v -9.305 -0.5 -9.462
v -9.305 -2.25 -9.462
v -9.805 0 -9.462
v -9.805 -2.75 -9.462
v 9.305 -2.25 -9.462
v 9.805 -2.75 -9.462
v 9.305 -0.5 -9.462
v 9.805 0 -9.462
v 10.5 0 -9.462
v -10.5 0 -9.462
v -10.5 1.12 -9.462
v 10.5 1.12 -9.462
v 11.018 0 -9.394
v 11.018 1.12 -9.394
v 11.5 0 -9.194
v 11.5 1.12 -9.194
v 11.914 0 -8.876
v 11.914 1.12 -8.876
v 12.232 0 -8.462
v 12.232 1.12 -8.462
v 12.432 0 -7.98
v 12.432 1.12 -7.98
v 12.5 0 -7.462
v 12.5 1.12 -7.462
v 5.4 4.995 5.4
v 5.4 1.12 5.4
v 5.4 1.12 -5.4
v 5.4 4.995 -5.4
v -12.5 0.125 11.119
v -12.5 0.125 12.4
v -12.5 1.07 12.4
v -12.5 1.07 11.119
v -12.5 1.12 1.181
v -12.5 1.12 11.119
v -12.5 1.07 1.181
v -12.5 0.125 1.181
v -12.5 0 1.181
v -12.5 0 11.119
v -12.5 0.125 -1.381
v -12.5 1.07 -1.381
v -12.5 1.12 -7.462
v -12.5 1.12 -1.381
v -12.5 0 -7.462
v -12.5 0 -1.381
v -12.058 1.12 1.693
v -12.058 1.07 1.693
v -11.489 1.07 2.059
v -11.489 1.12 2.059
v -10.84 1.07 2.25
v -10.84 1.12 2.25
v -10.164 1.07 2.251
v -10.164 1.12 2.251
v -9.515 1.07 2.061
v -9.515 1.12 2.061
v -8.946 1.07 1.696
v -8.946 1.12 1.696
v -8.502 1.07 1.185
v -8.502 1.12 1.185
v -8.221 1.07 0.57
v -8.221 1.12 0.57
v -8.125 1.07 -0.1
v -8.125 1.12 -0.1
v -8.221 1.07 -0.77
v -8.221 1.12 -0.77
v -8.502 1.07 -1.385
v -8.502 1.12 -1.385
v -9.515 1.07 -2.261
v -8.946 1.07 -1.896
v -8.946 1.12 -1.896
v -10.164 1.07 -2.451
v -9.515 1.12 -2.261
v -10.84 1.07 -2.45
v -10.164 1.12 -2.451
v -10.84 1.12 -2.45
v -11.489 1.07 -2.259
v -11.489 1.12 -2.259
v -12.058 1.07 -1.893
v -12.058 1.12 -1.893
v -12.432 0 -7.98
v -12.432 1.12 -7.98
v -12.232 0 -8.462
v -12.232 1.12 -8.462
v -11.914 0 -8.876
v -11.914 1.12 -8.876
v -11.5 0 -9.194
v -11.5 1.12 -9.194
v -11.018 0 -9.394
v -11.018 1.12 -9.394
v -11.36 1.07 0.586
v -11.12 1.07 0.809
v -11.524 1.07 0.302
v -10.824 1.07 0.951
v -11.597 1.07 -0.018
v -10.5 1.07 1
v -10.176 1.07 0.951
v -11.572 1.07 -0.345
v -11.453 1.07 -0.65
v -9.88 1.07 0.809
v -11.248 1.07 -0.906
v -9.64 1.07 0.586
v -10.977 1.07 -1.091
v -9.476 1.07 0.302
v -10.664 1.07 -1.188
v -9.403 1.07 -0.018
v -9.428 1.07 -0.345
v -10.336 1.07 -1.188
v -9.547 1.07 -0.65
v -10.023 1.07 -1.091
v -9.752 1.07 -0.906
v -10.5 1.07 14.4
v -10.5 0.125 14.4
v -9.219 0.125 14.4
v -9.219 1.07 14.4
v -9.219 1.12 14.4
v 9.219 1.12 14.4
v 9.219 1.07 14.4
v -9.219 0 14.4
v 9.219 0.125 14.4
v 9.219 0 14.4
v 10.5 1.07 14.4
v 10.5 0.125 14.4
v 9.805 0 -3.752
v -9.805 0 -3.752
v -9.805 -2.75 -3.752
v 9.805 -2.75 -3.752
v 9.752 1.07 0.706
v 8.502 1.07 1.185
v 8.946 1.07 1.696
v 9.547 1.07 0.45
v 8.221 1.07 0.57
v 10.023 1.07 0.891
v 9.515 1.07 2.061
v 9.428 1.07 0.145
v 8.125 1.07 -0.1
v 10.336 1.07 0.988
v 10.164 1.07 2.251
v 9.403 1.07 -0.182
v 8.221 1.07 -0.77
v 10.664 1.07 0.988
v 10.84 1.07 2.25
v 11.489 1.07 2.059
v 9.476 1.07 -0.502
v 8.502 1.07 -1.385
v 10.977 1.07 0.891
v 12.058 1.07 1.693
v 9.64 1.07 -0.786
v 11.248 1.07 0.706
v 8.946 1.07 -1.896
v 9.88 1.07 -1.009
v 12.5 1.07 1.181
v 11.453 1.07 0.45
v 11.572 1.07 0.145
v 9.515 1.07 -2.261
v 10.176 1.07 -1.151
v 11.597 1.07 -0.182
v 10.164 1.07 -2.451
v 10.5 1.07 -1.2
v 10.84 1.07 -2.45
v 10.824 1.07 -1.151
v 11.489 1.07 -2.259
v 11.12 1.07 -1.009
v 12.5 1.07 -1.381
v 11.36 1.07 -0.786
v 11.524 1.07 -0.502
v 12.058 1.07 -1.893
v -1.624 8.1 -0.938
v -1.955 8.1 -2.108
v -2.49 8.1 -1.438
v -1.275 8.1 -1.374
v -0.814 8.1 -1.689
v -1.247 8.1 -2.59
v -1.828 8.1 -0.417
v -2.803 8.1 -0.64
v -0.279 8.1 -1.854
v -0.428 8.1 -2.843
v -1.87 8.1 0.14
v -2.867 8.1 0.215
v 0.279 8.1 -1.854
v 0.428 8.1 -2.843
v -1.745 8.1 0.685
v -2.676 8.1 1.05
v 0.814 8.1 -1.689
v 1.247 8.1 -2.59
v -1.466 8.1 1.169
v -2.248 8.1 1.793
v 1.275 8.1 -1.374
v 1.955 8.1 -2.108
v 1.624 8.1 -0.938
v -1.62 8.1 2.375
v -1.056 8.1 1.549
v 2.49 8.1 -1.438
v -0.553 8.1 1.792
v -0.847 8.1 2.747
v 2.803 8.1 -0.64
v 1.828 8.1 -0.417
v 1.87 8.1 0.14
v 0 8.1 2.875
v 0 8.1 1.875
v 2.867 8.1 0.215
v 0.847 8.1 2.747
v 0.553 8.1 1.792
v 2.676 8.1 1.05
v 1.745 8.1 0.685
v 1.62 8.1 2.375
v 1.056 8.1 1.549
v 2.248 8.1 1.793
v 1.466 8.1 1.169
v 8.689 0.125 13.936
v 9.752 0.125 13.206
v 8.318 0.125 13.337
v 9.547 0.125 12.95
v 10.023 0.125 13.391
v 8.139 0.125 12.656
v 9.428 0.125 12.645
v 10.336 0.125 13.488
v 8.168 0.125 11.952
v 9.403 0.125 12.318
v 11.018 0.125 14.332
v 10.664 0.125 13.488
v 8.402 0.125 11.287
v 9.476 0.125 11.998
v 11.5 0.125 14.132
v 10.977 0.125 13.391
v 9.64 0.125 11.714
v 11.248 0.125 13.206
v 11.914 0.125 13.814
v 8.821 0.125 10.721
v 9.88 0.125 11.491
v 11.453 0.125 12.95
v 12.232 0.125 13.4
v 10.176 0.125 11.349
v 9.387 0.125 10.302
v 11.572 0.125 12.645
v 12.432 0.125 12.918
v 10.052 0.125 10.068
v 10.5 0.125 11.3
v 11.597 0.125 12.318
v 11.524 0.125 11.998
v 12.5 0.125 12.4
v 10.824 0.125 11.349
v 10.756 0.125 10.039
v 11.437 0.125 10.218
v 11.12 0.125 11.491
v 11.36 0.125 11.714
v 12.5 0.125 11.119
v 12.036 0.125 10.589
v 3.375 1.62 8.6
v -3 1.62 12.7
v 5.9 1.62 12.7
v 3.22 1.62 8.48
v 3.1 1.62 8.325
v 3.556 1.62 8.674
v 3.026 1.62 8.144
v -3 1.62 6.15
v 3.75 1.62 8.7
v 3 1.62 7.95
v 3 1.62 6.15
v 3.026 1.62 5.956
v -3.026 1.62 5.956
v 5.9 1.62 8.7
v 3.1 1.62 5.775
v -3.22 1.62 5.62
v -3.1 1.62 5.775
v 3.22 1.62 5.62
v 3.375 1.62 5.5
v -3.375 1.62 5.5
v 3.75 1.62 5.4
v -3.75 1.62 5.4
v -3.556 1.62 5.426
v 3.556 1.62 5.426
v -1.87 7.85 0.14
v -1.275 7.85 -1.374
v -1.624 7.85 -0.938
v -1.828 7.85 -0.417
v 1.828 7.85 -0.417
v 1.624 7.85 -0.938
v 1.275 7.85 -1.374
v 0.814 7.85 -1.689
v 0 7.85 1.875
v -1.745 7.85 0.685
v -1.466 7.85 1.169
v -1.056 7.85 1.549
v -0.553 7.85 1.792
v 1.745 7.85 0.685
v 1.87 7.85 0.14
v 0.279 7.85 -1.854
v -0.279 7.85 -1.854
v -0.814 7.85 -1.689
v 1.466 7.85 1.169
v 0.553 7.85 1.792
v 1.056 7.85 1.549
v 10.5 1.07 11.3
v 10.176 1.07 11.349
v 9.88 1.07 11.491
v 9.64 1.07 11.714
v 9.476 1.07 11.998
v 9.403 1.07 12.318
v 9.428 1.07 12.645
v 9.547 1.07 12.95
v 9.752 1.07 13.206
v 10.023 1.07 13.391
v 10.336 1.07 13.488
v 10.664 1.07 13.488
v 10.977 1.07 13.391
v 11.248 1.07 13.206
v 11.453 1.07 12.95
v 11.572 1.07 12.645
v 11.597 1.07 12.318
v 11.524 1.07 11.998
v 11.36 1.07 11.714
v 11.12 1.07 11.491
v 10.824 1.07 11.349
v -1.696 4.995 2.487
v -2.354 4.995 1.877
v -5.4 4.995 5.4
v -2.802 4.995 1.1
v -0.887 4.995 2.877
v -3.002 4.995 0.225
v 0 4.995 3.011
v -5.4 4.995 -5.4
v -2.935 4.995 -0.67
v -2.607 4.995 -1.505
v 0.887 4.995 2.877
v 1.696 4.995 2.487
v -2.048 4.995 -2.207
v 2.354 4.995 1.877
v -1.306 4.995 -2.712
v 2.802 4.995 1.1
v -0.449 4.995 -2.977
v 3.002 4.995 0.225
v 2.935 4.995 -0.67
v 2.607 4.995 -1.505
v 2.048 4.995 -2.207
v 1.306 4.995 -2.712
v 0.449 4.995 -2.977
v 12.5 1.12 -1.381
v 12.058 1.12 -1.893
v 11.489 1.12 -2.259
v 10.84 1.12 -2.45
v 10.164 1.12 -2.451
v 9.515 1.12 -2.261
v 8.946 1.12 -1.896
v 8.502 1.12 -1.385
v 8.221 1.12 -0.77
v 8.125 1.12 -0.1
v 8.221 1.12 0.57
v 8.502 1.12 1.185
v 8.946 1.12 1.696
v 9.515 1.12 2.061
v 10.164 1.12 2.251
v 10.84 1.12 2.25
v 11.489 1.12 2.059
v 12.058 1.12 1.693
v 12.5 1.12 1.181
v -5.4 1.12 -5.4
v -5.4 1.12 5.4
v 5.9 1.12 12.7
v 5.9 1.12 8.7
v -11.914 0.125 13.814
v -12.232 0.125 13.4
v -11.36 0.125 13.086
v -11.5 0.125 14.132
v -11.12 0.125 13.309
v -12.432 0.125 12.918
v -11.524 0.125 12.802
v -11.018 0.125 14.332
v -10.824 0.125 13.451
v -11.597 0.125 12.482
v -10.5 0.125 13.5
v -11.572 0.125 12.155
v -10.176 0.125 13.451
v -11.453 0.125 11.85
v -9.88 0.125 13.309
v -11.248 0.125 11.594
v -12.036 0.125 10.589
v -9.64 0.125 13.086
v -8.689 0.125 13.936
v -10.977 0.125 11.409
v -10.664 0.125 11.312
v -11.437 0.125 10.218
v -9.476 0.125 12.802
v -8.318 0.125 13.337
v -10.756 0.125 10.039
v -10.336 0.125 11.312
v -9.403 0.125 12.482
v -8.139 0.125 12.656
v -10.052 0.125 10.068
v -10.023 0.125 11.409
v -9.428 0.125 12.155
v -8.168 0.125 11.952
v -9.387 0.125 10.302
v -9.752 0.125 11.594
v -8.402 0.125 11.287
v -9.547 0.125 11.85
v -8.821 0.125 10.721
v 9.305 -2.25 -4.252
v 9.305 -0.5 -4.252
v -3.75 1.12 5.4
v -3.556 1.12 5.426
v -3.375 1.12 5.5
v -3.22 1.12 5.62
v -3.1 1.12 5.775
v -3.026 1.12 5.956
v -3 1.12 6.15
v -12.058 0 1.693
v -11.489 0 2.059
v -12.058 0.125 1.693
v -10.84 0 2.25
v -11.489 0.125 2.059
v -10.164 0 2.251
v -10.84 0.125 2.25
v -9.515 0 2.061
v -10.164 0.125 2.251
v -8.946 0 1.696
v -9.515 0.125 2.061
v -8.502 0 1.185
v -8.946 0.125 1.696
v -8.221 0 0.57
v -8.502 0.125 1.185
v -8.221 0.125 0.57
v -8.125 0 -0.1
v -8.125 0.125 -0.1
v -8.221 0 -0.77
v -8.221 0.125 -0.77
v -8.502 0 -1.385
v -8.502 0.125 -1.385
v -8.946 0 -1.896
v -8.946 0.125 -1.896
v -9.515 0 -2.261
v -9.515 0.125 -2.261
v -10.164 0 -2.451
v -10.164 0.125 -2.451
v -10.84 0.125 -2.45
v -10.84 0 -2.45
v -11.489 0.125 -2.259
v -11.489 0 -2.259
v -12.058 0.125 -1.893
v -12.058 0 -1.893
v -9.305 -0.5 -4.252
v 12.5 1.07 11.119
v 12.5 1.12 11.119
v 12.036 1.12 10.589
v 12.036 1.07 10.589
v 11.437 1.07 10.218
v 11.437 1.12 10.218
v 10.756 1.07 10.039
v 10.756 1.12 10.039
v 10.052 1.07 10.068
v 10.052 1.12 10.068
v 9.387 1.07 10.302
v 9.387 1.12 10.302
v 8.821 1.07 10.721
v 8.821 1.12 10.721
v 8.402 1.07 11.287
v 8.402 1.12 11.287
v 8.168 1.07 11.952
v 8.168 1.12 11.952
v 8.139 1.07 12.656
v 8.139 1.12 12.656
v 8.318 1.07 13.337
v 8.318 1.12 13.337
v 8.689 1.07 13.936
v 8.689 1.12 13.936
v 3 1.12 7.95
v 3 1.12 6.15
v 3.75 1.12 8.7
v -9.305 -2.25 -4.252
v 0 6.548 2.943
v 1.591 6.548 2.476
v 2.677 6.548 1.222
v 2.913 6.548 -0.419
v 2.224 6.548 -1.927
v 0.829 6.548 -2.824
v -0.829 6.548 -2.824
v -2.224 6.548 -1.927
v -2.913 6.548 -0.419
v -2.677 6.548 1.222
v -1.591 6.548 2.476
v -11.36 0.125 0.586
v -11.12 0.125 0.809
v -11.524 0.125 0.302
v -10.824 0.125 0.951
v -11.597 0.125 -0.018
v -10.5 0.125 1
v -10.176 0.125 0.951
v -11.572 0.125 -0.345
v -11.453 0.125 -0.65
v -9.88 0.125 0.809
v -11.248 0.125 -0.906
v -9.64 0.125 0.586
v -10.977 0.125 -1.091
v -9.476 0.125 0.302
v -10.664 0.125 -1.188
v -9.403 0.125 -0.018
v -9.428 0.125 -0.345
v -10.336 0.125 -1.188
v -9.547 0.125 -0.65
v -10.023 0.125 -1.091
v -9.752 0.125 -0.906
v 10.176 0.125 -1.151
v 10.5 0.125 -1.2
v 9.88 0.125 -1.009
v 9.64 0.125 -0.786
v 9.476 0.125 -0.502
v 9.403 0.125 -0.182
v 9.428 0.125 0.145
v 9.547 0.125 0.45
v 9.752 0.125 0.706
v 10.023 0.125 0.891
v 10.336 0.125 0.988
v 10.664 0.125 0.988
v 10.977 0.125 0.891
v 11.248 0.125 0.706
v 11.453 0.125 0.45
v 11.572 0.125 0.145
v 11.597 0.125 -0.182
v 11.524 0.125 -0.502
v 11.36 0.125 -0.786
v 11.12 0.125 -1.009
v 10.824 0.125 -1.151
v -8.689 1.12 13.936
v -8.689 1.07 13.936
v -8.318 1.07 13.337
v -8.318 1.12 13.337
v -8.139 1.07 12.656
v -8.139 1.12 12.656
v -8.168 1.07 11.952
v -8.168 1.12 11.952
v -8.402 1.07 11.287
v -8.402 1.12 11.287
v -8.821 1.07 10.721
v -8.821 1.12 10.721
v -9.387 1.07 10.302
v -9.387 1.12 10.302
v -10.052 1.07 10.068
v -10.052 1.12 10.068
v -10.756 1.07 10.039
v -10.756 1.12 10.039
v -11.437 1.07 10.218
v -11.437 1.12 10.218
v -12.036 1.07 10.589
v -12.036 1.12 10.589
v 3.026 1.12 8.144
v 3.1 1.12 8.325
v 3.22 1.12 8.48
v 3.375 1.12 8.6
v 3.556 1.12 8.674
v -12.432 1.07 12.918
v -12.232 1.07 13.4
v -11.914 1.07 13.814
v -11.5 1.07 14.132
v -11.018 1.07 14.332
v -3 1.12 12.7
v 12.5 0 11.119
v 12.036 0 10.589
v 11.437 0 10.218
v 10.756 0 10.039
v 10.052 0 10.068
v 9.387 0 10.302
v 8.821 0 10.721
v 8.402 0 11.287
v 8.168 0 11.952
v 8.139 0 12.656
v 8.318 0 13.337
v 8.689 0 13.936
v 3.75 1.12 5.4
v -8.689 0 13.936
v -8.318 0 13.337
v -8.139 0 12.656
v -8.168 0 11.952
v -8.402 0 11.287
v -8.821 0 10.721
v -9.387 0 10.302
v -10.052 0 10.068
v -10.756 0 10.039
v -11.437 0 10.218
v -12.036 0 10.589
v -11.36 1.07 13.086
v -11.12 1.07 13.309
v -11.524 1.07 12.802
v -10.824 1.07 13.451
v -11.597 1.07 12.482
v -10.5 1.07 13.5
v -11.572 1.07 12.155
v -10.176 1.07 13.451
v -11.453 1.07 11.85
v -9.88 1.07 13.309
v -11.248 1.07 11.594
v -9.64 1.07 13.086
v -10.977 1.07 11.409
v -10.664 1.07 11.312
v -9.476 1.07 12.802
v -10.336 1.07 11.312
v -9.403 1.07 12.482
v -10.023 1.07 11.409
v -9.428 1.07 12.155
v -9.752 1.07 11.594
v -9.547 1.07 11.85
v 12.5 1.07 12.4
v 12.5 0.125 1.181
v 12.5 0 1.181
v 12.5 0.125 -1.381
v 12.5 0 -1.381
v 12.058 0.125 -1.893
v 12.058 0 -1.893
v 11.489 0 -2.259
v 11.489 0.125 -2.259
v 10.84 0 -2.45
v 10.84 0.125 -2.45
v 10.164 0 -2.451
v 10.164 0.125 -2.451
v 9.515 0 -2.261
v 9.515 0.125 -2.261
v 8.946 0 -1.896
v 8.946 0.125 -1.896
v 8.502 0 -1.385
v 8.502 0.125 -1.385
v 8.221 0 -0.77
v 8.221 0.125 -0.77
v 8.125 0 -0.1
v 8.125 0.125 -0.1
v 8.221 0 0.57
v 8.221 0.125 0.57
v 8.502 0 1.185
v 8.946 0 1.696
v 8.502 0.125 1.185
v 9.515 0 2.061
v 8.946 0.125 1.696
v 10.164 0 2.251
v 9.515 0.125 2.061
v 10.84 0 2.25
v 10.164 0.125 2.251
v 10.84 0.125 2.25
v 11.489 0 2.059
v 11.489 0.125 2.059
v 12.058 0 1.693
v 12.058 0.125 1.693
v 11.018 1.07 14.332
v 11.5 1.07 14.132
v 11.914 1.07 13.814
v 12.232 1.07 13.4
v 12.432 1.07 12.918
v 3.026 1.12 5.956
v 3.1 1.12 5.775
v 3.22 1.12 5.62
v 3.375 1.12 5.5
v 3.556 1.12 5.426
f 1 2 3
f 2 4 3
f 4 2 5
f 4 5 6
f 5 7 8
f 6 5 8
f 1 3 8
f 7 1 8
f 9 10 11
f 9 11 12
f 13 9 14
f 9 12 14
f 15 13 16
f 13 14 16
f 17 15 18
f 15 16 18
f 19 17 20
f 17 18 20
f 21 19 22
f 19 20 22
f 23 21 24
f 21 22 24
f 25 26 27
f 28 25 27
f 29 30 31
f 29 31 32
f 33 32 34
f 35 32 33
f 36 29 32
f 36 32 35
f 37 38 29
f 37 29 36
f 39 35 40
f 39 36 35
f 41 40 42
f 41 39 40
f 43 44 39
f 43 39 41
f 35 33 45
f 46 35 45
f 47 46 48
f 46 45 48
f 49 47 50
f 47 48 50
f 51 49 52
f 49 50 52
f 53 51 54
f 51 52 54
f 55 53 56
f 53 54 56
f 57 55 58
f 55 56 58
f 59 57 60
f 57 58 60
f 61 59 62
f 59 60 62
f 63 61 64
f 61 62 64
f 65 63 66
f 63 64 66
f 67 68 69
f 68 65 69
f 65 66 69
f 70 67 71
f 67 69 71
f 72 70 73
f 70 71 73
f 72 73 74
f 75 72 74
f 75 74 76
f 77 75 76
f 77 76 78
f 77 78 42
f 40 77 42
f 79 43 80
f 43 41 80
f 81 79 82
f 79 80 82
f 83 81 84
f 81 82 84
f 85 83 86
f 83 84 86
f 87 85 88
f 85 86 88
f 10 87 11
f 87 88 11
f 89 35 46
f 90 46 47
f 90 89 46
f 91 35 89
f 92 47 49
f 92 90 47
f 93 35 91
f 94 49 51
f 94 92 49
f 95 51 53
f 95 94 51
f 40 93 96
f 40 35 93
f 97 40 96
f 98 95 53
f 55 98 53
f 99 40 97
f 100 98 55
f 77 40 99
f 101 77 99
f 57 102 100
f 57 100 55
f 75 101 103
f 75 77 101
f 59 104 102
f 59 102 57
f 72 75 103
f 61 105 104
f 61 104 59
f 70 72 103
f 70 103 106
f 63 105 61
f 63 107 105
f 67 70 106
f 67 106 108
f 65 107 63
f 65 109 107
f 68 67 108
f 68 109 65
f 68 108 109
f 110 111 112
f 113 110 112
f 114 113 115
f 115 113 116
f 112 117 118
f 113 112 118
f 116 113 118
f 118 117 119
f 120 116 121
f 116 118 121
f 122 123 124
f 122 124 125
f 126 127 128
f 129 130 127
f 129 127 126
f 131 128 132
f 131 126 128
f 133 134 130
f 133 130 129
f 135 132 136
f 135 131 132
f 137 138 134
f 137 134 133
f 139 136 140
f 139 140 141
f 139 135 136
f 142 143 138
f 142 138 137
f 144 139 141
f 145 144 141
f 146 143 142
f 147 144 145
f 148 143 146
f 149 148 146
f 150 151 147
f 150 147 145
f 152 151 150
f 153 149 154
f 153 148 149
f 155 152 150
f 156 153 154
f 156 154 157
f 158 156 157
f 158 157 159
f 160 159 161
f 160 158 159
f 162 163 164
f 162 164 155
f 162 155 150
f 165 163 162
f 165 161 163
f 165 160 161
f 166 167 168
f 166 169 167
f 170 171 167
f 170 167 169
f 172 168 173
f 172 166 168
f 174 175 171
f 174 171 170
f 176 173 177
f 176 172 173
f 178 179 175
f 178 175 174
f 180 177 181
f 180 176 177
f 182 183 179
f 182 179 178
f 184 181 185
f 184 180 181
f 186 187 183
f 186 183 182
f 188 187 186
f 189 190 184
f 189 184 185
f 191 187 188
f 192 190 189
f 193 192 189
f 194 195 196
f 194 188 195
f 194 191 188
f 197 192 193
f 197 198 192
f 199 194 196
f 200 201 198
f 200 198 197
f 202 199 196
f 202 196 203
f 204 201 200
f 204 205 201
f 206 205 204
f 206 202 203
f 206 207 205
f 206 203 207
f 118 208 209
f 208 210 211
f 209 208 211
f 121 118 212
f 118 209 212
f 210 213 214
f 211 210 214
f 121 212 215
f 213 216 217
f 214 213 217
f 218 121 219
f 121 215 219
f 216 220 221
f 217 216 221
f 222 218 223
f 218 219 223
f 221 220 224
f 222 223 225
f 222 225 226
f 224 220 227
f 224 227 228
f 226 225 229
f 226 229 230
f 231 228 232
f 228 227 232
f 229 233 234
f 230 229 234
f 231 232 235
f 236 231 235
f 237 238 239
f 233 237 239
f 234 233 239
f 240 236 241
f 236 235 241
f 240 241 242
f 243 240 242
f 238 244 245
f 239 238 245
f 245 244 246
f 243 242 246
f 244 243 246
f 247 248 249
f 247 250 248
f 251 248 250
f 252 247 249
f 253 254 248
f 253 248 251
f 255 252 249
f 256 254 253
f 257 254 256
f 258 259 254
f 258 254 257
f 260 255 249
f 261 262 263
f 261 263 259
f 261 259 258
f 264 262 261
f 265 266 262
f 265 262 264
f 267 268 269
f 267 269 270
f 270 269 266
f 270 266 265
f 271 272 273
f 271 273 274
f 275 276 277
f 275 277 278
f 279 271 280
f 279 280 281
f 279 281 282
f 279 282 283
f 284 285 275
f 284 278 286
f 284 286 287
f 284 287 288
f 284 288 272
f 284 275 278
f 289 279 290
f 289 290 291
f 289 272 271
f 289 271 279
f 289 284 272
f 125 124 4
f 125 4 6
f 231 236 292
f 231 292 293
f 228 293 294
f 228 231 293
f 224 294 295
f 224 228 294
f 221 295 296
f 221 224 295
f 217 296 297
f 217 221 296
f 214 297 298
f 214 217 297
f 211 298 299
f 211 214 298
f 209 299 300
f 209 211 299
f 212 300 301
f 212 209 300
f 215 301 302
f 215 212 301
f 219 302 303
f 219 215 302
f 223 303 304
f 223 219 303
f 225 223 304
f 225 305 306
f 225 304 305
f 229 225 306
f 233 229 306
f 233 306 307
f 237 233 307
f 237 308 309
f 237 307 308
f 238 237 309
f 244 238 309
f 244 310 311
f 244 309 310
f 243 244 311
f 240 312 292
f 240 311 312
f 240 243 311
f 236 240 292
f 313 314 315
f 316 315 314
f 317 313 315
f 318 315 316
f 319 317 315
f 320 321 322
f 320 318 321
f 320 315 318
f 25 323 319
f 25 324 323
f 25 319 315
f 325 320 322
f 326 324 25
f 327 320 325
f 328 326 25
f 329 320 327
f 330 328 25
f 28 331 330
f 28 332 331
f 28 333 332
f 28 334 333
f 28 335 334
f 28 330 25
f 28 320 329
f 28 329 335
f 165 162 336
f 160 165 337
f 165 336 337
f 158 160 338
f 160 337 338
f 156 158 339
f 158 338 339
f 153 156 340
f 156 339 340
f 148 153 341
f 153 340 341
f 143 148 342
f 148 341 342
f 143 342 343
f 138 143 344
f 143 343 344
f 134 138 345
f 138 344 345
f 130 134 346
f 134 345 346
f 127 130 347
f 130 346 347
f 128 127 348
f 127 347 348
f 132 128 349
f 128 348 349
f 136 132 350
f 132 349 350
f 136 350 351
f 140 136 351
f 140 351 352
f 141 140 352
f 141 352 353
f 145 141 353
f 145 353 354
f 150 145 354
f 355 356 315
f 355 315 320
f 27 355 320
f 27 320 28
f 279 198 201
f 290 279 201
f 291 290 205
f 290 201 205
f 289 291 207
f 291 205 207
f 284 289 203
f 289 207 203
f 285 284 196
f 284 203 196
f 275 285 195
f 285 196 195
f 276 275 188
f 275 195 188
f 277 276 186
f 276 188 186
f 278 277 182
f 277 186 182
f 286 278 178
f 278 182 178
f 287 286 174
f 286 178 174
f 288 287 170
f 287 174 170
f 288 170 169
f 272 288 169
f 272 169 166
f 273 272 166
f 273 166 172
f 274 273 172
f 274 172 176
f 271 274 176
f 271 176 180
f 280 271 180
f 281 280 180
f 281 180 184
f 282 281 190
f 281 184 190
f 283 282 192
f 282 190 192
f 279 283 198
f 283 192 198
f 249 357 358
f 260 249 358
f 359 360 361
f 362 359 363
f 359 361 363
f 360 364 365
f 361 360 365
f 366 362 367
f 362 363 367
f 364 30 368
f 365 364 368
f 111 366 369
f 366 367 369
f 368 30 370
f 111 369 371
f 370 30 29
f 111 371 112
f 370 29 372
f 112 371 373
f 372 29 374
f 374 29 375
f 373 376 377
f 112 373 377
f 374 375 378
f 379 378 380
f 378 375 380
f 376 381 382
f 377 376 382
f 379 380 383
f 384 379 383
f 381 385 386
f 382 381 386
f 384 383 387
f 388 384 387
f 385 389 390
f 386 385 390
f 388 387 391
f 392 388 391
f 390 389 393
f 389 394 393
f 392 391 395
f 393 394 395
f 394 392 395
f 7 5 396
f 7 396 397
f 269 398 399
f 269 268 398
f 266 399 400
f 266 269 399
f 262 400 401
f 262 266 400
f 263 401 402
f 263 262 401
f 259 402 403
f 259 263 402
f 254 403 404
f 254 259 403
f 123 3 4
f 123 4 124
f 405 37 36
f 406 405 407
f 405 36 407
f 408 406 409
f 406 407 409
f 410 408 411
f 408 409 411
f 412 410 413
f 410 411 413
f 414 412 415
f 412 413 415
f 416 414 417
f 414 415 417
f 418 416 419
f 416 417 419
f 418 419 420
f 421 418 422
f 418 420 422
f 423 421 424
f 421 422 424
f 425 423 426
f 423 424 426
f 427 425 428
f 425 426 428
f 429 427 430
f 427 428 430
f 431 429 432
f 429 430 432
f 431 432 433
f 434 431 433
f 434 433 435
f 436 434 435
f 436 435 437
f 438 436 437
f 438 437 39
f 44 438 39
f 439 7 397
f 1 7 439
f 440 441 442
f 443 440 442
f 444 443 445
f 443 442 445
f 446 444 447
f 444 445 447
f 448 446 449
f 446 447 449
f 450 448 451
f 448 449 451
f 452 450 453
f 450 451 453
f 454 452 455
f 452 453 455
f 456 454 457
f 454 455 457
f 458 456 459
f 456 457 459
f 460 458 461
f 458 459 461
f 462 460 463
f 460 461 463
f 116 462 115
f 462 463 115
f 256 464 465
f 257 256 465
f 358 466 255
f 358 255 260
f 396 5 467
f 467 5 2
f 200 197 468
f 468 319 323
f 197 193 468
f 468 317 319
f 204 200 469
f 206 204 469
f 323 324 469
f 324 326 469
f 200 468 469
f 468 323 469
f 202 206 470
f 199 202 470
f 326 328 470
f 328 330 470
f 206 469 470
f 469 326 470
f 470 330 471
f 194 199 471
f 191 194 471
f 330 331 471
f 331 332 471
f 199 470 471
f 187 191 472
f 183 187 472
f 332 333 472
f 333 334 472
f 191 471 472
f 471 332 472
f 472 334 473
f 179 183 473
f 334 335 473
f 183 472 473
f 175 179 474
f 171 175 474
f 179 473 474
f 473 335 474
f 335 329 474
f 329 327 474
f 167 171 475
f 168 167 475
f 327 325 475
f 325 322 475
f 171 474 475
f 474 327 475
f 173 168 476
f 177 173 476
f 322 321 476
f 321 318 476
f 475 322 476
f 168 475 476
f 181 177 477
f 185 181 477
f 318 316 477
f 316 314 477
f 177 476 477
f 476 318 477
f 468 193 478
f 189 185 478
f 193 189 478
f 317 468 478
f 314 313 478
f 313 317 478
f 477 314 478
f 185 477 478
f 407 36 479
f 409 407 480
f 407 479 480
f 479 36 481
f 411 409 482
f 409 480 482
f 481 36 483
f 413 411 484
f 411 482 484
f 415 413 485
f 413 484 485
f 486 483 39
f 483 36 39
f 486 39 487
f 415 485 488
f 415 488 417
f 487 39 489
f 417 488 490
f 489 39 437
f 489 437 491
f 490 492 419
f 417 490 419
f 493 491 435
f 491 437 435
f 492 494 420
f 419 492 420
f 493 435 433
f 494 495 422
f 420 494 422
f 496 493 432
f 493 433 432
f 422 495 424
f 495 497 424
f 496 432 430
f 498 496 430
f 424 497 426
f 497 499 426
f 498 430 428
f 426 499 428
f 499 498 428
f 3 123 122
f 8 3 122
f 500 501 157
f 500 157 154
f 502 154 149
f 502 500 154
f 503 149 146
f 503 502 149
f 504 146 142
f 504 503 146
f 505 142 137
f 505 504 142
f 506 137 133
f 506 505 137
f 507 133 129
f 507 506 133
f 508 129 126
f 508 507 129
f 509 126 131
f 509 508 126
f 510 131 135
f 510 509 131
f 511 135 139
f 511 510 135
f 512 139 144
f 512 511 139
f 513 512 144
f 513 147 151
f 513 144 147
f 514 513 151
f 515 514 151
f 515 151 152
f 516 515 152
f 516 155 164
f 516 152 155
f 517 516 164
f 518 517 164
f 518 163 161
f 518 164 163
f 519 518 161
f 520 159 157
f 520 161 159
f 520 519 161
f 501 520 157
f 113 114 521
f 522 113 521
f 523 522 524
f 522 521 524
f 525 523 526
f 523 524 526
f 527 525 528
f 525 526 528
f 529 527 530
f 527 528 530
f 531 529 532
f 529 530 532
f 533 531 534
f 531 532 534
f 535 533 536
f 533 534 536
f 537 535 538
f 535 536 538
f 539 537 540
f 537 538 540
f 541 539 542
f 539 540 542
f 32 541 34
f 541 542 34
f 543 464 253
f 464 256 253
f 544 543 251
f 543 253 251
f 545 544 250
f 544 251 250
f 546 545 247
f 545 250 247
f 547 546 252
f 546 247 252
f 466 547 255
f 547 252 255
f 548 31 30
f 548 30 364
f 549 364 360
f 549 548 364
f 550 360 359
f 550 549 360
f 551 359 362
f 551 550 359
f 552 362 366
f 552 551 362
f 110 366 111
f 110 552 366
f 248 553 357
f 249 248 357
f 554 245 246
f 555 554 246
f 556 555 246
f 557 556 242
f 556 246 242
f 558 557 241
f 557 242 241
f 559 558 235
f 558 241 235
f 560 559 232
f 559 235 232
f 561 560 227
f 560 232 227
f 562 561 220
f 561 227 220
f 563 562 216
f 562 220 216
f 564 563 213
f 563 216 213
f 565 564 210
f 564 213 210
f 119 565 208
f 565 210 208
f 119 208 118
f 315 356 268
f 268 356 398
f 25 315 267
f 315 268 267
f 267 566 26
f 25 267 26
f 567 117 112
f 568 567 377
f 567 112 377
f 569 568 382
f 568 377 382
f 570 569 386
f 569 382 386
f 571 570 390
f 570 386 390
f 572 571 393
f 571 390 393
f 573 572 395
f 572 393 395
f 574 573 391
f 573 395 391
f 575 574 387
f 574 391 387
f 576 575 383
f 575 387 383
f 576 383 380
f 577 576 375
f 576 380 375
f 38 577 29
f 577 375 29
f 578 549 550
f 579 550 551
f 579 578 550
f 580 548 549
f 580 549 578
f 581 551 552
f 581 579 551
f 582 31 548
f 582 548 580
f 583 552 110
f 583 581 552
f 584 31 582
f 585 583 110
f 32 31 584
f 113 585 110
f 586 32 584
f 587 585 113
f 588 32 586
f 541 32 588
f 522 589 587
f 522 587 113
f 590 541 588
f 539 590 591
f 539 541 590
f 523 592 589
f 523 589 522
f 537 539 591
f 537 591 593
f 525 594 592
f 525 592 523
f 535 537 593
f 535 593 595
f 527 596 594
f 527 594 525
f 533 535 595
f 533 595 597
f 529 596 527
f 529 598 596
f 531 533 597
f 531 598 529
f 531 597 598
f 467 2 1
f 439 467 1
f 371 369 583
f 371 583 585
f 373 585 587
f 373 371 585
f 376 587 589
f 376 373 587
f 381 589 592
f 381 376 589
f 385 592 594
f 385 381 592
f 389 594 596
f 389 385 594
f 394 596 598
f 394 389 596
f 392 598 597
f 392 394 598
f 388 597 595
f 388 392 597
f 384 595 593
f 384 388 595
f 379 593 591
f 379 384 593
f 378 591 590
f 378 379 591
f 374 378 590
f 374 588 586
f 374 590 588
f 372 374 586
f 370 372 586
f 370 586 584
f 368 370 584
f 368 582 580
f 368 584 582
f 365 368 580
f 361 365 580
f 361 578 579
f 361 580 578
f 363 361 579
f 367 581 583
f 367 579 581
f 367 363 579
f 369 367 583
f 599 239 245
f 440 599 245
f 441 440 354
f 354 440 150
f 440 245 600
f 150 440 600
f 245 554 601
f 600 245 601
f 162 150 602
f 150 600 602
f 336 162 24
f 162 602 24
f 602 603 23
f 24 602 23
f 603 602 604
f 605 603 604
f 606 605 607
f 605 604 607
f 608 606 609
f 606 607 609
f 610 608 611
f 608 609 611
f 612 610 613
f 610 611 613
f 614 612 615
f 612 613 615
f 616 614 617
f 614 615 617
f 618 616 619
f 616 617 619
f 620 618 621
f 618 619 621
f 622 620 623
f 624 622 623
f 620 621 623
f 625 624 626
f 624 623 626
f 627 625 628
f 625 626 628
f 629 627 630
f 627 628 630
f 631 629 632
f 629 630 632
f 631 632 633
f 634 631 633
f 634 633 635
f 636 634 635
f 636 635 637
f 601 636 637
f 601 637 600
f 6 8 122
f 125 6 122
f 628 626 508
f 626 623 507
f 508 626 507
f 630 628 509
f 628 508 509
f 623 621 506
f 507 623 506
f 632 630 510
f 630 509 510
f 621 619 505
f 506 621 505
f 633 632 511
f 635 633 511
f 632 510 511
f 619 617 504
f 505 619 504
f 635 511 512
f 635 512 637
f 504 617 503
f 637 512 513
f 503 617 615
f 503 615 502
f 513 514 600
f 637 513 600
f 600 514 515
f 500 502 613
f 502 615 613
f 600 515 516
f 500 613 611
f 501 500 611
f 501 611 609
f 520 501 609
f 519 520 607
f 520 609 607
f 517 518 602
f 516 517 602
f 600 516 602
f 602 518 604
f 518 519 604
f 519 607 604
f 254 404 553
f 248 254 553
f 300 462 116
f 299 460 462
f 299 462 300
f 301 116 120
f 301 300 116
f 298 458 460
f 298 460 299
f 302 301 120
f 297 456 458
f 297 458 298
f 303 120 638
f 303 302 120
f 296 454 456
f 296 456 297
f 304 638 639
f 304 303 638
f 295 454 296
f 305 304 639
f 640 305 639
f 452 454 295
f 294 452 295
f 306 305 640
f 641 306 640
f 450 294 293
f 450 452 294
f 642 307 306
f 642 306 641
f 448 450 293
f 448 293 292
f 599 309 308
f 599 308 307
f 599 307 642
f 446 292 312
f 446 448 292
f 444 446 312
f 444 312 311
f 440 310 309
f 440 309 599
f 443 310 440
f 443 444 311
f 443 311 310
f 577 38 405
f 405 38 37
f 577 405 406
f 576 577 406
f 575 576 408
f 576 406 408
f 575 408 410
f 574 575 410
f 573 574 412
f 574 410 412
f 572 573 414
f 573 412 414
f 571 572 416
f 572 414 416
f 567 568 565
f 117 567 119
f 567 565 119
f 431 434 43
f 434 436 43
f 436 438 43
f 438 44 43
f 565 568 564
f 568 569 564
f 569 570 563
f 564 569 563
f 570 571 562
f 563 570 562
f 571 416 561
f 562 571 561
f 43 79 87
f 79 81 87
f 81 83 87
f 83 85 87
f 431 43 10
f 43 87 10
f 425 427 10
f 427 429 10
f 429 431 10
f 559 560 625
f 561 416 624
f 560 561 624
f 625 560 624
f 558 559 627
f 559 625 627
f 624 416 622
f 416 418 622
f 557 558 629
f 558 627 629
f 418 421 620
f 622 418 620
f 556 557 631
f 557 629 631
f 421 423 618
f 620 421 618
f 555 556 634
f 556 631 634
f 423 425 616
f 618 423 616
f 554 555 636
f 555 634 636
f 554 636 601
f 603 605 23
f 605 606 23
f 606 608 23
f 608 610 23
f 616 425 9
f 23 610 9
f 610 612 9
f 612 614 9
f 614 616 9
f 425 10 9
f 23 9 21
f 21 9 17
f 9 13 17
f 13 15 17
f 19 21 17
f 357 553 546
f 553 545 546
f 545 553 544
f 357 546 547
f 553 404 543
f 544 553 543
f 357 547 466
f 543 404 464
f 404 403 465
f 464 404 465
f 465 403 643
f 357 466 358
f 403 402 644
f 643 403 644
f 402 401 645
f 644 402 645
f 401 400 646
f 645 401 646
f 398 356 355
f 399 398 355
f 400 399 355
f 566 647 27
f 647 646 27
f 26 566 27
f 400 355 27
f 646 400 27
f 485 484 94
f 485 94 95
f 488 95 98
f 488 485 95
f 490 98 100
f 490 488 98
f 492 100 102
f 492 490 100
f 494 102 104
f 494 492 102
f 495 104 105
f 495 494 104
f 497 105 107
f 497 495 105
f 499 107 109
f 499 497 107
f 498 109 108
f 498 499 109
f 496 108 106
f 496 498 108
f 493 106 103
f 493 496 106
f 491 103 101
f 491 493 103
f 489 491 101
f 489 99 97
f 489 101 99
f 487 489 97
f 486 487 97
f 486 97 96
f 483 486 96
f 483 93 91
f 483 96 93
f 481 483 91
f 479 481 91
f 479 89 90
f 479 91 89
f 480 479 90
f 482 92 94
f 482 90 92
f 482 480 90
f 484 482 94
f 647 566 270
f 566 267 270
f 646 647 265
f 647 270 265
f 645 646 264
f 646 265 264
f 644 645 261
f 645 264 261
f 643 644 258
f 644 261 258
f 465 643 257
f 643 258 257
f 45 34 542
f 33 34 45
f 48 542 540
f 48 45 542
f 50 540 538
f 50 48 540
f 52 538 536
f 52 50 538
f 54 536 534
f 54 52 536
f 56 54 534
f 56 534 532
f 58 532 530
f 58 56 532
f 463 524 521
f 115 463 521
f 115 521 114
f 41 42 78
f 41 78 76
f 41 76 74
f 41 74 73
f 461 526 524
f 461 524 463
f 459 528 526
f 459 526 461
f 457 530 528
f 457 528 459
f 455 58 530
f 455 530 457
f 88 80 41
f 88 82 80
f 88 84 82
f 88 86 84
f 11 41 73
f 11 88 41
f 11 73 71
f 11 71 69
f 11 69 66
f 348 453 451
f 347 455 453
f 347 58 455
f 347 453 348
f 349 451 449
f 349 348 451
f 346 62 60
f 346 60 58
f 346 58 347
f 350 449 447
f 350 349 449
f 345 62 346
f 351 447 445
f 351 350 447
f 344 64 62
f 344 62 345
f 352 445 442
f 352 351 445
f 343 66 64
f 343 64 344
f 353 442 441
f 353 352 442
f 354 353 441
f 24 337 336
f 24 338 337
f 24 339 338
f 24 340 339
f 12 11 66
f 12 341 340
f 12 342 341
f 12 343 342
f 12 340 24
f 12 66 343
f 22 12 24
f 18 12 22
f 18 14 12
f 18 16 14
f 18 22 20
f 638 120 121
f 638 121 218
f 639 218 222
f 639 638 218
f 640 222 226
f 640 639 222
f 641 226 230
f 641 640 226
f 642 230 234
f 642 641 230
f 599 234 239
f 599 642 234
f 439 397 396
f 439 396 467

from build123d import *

# Parameters (mm, degrees)
SKETCH1_W           = 25
SKETCH1_H           = 23.862
SKETCH1_R           = 1.1
BOSS_EXTRUDE1_DEPTH = 1.12
FILLET1_R           = 2
SKETCH2_R           = 2.375
CUT_EXTRUDE1_DEPTH  = 0.05
CUT_EXTRUDE2_START  = -0.995
SKETCH2_3_R         = 2.375
CUT_EXTRUDE2_DEPTH  = 0.125
SKETCH3_W           = 10.8
SKETCH3_H           = 10.8
BOSS_EXTRUDE2_DEPTH = 3.875
BOSS_EXTRUDE3_START = 3.875
SKETCH3_3_R         = 2.875
BOSS_EXTRUDE3_DEPTH = 3.105
SKETCH5_R           = 1.875
CUT_EXTRUDE3_DEPTH  = 0.25
DRAFT1_ANGLE        = 2.5
SKETCH6_W           = 6
SKETCH6_H           = 3.3
SKETCH6_H_2         = 4
SKETCH6_W_2         = 2.9
BOSS_EXTRUDE4_DEPTH = 0.5
FILLET2_R           = 0.75
SKETCH7_W           = 19.61
SKETCH7_H           = 5.71
BOSS_EXTRUDE5_DEPTH = 2.75
SKETCH8_W           = 18.61
SKETCH8_H           = 1.75
CUT_EXTRUDE4_DEPTH  = 5.21


with BuildPart() as part:
    # Sketch1 → Boss-Extrude1 (new body)
    with BuildSketch(Plane(origin=(0, 0, 0), x_dir=(1, 0, 0), z_dir=(0, 1, 0))):
        with Locations((0, -2.469)):
            Rectangle(SKETCH1_W, SKETCH1_H)
        with Locations(Location((-10.5, -12.4, 0), (0, 0, 270))):
            Circle(SKETCH1_R, mode=Mode.SUBTRACT)
        with Locations(Location((-10.5, 0.1, 0), (0, 0, 270))):
            Circle(SKETCH1_R, mode=Mode.SUBTRACT)
        with Locations(Location((10.5, -12.4, 0), (0, 0, 90))):
            Circle(SKETCH1_R, mode=Mode.SUBTRACT)
        with Locations(Location((10.5, 0.1, 0), (0, 0, 90))):
            Circle(SKETCH1_R, mode=Mode.SUBTRACT)
    extrude(amount=BOSS_EXTRUDE1_DEPTH)

    # Fillet1
    fillet1_edges = [part.edges().sort_by_distance(p)[0] for p in [
        (12.5, 0.56, 14.4),
        (-12.5, 0.56, 14.4),
        (-12.5, 0.56, -9.462),
        (12.5, 0.56, -9.462),
    ]]
    fillet(fillet1_edges, radius=FILLET1_R)

    # Sketch2 → Cut-Extrude1 (cut)
    with BuildSketch(Plane(origin=(0, 1.12, 0), x_dir=(1, 0, 0), z_dir=(0, 1, 0))):
        with Locations((-10.5, -12.4)):
            Circle(SKETCH2_R)
        with Locations((-10.5, 0.1)):
            Circle(SKETCH2_R)
        with Locations((10.5, -12.4)):
            Circle(SKETCH2_R)
        with Locations((10.5, 0.1)):
            Circle(SKETCH2_R)
    extrude(amount=-CUT_EXTRUDE1_DEPTH, mode=Mode.SUBTRACT)

    # Sketch2<3> → Cut-Extrude2 (cut)
    with BuildSketch(Plane(origin=(0, 1.12, 0), x_dir=(1, 0, 0), z_dir=(0, 1, 0)).offset(CUT_EXTRUDE2_START)):
        with Locations((-10.5, -12.4)):
            Circle(SKETCH2_3_R)
        with Locations((-10.5, 0.1)):
            Circle(SKETCH2_3_R)
        with Locations((10.5, -12.4)):
            Circle(SKETCH2_3_R)
        with Locations((10.5, 0.1)):
            Circle(SKETCH2_3_R)
    extrude(amount=-CUT_EXTRUDE2_DEPTH, mode=Mode.SUBTRACT)


with BuildPart() as body_2:
    # Sketch3 → Boss-Extrude2 (new body)
    with BuildSketch(Plane(origin=(0, 1.12, 0), x_dir=(1, 0, 0), z_dir=(0, 1, 0))):
        Rectangle(SKETCH3_W, SKETCH3_H)
    extrude(amount=BOSS_EXTRUDE2_DEPTH)

    # Sketch3<3> → Boss-Extrude3 (add)
    with BuildSketch(Plane(origin=(0, 1.12, 0), x_dir=(1, 0, 0), z_dir=(0, 1, 0)).offset(BOSS_EXTRUDE3_START)):
        with Locations(Location((0, 0, 0), (0, 0, 270))):
            Circle(SKETCH3_3_R)
    extrude(amount=BOSS_EXTRUDE3_DEPTH)

    # Sketch5 → Cut-Extrude3 (cut)
    with BuildSketch(Plane(origin=(0, 8.1, 0), x_dir=(1, 0, 0), z_dir=(0, 1, 0))):
        with Locations(Location((0, 0, 0), (0, 0, 270))):
            Circle(SKETCH5_R)
    extrude(amount=-CUT_EXTRUDE3_DEPTH, mode=Mode.SUBTRACT)

    # Draft1
    draft1_faces = [body_2.faces().sort_by_distance(p)[0] for p in [
        (0, 6.5475, -2.875),
    ]]
    draft(draft1_faces, Plane.ZX.offset(8.1), DRAFT1_ANGLE)

    # Sketch6 → Boss-Extrude4 (add)
    with BuildSketch(Plane(origin=(0, 1.12, 0), x_dir=(1, 0, 0), z_dir=(0, 1, 0))):
        with Locations((0, -7.05)):
            Rectangle(SKETCH6_W, SKETCH6_H)
        with Locations((0, -10.7)):
            Rectangle(SKETCH6_W, SKETCH6_H_2)
        with Locations((4.45, -10.7)):
            Rectangle(SKETCH6_W_2, SKETCH6_H_2)
    extrude(amount=BOSS_EXTRUDE4_DEPTH)

    # Fillet2
    fillet2_edges = [body_2.edges().sort_by_distance(p)[0] for p in [
        (-3, 1.37, 5.4),
        (3, 1.37, 8.7),
        (3, 1.37, 5.4),
    ]]
    fillet(fillet2_edges, radius=FILLET2_R)


with BuildPart() as body_3:
    # Sketch7 → Boss-Extrude5 (new body)
    with BuildSketch(Plane.XZ):
        with Locations((0, -6.607)):
            Rectangle(SKETCH7_W, SKETCH7_H)
    extrude(amount=BOSS_EXTRUDE5_DEPTH)

    # Sketch8 → Cut-Extrude4 (cut)
    with BuildSketch(Plane(origin=(0, 0, -9.462), x_dir=(-1, 0, 0), z_dir=(0, 0, -1))):
        with Locations((0, -1.375)):
            Rectangle(SKETCH8_W, SKETCH8_H)
    extrude(amount=-CUT_EXTRUDE4_DEPTH, mode=Mode.SUBTRACT)


solid = Compound([part.part, body_2.part, body_3.part])
